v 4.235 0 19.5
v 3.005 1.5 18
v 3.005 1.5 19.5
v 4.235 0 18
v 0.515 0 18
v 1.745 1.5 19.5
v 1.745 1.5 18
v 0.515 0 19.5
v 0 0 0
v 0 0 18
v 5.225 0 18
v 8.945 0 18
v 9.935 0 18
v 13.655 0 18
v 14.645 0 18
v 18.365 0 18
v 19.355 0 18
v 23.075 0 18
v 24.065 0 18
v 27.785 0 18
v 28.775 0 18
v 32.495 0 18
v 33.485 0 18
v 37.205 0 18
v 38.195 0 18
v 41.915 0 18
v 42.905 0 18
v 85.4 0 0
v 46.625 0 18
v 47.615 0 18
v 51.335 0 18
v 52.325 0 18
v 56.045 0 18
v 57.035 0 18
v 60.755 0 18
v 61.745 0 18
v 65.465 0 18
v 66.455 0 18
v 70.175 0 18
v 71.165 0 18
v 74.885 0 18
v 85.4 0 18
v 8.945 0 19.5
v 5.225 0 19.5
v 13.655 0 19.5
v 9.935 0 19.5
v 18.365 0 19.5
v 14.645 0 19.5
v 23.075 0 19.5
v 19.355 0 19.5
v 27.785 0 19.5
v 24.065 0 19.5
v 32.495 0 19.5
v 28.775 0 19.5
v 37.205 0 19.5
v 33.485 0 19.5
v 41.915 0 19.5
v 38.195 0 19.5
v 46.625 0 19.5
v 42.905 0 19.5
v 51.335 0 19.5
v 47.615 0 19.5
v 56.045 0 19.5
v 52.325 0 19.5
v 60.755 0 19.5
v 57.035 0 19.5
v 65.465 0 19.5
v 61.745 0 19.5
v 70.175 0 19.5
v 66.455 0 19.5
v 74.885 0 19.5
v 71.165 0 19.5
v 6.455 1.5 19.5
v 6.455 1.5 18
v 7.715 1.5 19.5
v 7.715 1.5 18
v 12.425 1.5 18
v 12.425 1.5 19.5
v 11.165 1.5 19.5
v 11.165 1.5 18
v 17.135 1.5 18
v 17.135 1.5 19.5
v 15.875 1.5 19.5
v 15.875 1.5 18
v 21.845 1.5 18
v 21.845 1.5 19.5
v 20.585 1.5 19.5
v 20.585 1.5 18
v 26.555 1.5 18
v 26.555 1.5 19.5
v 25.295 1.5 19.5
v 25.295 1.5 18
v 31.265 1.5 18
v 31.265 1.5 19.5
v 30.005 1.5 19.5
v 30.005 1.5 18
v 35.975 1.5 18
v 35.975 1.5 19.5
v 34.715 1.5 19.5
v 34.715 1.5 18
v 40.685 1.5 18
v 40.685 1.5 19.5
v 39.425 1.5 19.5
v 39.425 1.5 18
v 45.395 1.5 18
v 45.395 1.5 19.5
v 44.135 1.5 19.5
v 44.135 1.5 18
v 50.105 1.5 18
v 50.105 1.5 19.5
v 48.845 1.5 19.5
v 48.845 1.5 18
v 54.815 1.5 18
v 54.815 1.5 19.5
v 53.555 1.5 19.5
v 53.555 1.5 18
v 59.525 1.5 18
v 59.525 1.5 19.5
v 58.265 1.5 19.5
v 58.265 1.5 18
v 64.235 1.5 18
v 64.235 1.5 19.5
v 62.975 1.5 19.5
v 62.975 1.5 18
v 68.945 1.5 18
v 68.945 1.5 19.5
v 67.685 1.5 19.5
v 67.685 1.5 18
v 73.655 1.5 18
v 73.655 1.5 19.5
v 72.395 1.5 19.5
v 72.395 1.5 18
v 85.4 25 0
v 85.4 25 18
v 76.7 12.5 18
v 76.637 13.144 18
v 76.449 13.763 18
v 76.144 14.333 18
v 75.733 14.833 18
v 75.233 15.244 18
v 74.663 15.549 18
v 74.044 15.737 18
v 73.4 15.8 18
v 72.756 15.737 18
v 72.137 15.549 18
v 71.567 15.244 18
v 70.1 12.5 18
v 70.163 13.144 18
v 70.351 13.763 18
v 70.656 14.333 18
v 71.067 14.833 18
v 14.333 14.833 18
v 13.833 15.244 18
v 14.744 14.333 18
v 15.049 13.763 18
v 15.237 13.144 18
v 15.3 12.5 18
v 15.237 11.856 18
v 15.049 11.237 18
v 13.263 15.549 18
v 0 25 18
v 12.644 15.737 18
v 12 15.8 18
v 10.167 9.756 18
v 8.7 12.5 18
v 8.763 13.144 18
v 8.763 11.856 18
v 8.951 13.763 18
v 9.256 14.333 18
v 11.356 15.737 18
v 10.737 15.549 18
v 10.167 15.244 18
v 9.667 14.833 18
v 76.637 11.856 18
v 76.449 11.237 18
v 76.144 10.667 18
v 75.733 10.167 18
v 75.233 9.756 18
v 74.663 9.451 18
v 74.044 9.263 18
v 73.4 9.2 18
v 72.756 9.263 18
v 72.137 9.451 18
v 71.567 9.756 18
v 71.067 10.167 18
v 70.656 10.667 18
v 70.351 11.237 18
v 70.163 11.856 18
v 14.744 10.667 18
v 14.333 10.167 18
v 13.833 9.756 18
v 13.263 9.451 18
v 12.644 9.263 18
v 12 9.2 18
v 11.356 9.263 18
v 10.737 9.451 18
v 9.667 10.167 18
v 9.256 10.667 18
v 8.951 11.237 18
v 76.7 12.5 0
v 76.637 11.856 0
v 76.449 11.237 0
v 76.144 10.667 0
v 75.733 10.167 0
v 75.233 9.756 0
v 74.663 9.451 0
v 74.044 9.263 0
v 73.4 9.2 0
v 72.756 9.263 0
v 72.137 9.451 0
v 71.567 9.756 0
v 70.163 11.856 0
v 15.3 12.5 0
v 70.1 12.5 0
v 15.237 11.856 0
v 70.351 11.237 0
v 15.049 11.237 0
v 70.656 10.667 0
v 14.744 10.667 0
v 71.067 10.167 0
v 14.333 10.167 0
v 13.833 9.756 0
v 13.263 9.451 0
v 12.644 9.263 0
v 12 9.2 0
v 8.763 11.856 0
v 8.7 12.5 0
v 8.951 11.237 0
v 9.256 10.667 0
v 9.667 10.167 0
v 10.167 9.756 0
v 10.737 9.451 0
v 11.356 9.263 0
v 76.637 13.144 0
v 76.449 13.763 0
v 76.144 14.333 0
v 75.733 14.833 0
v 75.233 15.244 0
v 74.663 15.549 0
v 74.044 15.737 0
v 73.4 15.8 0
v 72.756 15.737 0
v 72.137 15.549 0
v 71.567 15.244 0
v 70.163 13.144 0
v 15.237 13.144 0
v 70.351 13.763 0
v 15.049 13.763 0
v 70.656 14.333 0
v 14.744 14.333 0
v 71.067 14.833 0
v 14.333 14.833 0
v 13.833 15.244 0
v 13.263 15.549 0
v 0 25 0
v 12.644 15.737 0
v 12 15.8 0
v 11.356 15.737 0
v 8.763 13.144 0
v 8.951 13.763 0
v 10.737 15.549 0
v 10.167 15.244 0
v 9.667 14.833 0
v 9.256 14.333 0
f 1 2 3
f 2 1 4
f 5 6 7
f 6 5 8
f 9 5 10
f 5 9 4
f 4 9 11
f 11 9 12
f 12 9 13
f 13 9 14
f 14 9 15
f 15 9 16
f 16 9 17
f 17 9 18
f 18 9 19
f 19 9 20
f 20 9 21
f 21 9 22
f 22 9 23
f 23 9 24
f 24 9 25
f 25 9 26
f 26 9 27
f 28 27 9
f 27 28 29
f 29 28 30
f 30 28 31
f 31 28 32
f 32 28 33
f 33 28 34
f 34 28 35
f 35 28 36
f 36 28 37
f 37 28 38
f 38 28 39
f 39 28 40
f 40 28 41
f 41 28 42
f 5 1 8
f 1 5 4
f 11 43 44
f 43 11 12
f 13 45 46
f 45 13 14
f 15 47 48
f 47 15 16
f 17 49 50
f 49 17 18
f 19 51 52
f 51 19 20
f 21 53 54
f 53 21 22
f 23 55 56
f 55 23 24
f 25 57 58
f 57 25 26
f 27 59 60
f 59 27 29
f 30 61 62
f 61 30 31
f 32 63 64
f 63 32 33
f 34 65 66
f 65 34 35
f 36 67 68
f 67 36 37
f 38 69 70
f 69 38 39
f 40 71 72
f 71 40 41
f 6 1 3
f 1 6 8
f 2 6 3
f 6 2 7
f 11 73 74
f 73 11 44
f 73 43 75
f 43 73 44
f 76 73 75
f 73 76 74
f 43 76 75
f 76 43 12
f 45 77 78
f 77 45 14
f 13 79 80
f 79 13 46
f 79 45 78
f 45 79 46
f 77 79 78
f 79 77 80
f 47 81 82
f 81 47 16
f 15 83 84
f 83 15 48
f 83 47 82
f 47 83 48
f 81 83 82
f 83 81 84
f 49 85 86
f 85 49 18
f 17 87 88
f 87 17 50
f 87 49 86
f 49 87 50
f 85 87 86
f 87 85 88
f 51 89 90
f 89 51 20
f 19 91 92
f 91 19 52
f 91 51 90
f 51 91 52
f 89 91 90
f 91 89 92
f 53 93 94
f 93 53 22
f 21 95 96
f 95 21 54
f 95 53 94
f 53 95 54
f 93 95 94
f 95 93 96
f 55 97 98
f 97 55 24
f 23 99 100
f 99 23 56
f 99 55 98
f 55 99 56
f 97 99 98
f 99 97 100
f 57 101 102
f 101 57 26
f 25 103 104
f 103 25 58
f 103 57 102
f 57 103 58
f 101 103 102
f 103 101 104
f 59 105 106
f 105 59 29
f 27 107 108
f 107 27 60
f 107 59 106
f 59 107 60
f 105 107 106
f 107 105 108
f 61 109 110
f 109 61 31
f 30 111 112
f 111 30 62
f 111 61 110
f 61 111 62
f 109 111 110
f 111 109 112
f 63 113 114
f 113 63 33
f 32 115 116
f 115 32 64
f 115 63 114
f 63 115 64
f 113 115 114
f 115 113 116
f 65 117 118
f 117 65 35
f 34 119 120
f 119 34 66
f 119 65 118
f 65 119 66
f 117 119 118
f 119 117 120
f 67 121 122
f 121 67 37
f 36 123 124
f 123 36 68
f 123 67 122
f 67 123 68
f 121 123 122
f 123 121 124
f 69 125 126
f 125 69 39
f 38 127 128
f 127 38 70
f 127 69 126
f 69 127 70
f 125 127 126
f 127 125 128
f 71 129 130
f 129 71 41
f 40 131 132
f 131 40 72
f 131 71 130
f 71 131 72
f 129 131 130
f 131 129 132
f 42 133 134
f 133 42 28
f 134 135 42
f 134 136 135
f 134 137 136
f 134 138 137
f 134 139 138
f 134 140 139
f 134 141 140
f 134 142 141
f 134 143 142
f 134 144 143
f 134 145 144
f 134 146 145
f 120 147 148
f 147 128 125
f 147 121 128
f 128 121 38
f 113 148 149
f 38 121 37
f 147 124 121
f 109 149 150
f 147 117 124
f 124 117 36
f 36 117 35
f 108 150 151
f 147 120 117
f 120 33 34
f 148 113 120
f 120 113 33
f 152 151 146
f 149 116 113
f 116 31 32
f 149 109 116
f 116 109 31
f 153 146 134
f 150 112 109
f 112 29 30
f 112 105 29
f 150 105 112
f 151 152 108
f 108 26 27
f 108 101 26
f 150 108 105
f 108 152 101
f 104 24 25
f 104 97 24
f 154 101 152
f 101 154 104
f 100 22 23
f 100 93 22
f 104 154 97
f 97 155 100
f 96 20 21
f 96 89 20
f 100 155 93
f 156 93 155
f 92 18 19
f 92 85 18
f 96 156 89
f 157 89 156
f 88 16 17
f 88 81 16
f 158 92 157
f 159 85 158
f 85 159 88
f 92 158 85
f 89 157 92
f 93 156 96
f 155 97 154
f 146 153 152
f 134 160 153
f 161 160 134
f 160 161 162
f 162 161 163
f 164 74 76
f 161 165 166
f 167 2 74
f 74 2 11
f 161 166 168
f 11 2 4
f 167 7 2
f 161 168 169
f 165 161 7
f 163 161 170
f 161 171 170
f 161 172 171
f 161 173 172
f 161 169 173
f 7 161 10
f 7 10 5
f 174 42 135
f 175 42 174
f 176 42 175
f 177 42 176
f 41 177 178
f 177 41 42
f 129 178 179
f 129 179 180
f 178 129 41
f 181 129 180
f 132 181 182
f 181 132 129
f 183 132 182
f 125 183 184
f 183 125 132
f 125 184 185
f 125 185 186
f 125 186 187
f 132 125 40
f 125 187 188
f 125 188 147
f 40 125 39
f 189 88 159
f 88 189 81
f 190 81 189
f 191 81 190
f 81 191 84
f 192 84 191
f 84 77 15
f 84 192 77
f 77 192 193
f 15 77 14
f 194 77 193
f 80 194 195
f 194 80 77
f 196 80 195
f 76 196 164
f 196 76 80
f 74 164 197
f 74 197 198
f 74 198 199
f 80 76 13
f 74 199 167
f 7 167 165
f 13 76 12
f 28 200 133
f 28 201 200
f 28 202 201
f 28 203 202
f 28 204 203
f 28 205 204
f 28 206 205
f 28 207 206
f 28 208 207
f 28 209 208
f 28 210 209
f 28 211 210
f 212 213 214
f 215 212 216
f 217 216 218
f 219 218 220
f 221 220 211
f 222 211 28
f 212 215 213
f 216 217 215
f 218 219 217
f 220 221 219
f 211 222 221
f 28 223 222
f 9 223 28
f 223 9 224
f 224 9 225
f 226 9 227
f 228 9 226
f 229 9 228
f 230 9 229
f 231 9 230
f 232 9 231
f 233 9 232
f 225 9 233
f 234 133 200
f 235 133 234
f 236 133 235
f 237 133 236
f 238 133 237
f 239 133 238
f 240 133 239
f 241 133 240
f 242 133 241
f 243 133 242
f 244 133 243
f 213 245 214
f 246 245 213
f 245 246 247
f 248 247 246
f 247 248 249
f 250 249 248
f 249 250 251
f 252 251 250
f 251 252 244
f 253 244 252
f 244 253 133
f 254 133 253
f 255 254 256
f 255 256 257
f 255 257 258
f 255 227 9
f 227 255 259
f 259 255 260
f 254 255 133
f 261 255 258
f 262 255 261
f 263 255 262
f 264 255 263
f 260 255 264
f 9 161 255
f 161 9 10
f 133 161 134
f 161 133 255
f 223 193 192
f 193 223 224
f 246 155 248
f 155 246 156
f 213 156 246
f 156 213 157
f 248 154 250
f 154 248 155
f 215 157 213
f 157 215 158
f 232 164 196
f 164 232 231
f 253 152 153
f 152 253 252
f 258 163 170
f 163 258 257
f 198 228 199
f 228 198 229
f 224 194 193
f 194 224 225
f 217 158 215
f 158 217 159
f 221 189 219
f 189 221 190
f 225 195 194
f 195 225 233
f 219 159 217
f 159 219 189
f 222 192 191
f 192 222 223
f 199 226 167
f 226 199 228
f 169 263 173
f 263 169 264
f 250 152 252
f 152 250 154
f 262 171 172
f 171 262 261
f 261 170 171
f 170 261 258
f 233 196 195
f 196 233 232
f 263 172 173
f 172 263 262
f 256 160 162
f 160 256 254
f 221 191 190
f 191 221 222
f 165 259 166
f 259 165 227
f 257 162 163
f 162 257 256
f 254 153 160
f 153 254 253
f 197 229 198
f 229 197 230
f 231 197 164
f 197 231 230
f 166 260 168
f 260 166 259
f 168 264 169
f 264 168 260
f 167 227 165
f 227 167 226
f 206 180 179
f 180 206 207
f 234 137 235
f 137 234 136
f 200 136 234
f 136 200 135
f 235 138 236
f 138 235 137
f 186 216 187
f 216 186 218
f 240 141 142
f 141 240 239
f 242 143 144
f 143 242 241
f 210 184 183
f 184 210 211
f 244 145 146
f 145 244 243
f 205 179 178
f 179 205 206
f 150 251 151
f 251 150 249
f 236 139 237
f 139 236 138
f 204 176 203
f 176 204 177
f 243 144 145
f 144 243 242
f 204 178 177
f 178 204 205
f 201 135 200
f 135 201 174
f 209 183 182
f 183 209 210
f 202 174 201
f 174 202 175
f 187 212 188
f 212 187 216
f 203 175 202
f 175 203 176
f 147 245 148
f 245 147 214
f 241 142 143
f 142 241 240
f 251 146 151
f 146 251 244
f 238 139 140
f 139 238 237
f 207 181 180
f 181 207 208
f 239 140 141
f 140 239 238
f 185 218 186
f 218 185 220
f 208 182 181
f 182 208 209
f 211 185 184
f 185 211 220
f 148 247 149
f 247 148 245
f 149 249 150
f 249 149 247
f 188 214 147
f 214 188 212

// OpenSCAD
$fn = 32;

// ----------------------------------------------------------------------
// Gear rack: m=1.5 z=16, 85.4 x 25 x 19.5 mm
// ----------------------------------------------------------------------

// --- parameters (mm) ---
rack_len = 85.4;          // rack length, X
rack_w = 25;              // rack width, Y
rack_h = 19.5;            // overall height, Z
modul = 1.5;              // module
body_t = 18;              // tooth root line height
pitch = 4.71;             // circular pitch
tip_w = 1.26;             // tooth thickness at the tip
root_w = 3.72;            // tooth thickness at the root line
hole_d = 6.6;             // mounting hole
sink = 0.6;               // tooth root overlap into the body

tooth_span = 75.4;

module tooth(x0) {
  /* 20 deg flank profile, sunk into the body for a positive overlap */
  translate([x0, 0, body_t - sink])
    linear_extrude(height = rack_h - body_t + sink)
      polygon(points = [[-root_w / 2, 0], [root_w / 2, 0],
                        [tip_w / 2, rack_h - body_t],
                        [-tip_w / 2, rack_h - body_t]]);
}

difference() {
  union() {
    cube([rack_len, rack_w, body_t]);
    for (i = [0 : 16 - 1])
      tooth((i + 0.5) * pitch + (tooth_span - 16 * pitch) / 2);
  }
  translate([12, 12.5, -1]) cylinder(h = body_t + 2, d = hole_d);
  translate([73.4, 12.5, -1]) cylinder(h = body_t + 2, d = hole_d);
}
